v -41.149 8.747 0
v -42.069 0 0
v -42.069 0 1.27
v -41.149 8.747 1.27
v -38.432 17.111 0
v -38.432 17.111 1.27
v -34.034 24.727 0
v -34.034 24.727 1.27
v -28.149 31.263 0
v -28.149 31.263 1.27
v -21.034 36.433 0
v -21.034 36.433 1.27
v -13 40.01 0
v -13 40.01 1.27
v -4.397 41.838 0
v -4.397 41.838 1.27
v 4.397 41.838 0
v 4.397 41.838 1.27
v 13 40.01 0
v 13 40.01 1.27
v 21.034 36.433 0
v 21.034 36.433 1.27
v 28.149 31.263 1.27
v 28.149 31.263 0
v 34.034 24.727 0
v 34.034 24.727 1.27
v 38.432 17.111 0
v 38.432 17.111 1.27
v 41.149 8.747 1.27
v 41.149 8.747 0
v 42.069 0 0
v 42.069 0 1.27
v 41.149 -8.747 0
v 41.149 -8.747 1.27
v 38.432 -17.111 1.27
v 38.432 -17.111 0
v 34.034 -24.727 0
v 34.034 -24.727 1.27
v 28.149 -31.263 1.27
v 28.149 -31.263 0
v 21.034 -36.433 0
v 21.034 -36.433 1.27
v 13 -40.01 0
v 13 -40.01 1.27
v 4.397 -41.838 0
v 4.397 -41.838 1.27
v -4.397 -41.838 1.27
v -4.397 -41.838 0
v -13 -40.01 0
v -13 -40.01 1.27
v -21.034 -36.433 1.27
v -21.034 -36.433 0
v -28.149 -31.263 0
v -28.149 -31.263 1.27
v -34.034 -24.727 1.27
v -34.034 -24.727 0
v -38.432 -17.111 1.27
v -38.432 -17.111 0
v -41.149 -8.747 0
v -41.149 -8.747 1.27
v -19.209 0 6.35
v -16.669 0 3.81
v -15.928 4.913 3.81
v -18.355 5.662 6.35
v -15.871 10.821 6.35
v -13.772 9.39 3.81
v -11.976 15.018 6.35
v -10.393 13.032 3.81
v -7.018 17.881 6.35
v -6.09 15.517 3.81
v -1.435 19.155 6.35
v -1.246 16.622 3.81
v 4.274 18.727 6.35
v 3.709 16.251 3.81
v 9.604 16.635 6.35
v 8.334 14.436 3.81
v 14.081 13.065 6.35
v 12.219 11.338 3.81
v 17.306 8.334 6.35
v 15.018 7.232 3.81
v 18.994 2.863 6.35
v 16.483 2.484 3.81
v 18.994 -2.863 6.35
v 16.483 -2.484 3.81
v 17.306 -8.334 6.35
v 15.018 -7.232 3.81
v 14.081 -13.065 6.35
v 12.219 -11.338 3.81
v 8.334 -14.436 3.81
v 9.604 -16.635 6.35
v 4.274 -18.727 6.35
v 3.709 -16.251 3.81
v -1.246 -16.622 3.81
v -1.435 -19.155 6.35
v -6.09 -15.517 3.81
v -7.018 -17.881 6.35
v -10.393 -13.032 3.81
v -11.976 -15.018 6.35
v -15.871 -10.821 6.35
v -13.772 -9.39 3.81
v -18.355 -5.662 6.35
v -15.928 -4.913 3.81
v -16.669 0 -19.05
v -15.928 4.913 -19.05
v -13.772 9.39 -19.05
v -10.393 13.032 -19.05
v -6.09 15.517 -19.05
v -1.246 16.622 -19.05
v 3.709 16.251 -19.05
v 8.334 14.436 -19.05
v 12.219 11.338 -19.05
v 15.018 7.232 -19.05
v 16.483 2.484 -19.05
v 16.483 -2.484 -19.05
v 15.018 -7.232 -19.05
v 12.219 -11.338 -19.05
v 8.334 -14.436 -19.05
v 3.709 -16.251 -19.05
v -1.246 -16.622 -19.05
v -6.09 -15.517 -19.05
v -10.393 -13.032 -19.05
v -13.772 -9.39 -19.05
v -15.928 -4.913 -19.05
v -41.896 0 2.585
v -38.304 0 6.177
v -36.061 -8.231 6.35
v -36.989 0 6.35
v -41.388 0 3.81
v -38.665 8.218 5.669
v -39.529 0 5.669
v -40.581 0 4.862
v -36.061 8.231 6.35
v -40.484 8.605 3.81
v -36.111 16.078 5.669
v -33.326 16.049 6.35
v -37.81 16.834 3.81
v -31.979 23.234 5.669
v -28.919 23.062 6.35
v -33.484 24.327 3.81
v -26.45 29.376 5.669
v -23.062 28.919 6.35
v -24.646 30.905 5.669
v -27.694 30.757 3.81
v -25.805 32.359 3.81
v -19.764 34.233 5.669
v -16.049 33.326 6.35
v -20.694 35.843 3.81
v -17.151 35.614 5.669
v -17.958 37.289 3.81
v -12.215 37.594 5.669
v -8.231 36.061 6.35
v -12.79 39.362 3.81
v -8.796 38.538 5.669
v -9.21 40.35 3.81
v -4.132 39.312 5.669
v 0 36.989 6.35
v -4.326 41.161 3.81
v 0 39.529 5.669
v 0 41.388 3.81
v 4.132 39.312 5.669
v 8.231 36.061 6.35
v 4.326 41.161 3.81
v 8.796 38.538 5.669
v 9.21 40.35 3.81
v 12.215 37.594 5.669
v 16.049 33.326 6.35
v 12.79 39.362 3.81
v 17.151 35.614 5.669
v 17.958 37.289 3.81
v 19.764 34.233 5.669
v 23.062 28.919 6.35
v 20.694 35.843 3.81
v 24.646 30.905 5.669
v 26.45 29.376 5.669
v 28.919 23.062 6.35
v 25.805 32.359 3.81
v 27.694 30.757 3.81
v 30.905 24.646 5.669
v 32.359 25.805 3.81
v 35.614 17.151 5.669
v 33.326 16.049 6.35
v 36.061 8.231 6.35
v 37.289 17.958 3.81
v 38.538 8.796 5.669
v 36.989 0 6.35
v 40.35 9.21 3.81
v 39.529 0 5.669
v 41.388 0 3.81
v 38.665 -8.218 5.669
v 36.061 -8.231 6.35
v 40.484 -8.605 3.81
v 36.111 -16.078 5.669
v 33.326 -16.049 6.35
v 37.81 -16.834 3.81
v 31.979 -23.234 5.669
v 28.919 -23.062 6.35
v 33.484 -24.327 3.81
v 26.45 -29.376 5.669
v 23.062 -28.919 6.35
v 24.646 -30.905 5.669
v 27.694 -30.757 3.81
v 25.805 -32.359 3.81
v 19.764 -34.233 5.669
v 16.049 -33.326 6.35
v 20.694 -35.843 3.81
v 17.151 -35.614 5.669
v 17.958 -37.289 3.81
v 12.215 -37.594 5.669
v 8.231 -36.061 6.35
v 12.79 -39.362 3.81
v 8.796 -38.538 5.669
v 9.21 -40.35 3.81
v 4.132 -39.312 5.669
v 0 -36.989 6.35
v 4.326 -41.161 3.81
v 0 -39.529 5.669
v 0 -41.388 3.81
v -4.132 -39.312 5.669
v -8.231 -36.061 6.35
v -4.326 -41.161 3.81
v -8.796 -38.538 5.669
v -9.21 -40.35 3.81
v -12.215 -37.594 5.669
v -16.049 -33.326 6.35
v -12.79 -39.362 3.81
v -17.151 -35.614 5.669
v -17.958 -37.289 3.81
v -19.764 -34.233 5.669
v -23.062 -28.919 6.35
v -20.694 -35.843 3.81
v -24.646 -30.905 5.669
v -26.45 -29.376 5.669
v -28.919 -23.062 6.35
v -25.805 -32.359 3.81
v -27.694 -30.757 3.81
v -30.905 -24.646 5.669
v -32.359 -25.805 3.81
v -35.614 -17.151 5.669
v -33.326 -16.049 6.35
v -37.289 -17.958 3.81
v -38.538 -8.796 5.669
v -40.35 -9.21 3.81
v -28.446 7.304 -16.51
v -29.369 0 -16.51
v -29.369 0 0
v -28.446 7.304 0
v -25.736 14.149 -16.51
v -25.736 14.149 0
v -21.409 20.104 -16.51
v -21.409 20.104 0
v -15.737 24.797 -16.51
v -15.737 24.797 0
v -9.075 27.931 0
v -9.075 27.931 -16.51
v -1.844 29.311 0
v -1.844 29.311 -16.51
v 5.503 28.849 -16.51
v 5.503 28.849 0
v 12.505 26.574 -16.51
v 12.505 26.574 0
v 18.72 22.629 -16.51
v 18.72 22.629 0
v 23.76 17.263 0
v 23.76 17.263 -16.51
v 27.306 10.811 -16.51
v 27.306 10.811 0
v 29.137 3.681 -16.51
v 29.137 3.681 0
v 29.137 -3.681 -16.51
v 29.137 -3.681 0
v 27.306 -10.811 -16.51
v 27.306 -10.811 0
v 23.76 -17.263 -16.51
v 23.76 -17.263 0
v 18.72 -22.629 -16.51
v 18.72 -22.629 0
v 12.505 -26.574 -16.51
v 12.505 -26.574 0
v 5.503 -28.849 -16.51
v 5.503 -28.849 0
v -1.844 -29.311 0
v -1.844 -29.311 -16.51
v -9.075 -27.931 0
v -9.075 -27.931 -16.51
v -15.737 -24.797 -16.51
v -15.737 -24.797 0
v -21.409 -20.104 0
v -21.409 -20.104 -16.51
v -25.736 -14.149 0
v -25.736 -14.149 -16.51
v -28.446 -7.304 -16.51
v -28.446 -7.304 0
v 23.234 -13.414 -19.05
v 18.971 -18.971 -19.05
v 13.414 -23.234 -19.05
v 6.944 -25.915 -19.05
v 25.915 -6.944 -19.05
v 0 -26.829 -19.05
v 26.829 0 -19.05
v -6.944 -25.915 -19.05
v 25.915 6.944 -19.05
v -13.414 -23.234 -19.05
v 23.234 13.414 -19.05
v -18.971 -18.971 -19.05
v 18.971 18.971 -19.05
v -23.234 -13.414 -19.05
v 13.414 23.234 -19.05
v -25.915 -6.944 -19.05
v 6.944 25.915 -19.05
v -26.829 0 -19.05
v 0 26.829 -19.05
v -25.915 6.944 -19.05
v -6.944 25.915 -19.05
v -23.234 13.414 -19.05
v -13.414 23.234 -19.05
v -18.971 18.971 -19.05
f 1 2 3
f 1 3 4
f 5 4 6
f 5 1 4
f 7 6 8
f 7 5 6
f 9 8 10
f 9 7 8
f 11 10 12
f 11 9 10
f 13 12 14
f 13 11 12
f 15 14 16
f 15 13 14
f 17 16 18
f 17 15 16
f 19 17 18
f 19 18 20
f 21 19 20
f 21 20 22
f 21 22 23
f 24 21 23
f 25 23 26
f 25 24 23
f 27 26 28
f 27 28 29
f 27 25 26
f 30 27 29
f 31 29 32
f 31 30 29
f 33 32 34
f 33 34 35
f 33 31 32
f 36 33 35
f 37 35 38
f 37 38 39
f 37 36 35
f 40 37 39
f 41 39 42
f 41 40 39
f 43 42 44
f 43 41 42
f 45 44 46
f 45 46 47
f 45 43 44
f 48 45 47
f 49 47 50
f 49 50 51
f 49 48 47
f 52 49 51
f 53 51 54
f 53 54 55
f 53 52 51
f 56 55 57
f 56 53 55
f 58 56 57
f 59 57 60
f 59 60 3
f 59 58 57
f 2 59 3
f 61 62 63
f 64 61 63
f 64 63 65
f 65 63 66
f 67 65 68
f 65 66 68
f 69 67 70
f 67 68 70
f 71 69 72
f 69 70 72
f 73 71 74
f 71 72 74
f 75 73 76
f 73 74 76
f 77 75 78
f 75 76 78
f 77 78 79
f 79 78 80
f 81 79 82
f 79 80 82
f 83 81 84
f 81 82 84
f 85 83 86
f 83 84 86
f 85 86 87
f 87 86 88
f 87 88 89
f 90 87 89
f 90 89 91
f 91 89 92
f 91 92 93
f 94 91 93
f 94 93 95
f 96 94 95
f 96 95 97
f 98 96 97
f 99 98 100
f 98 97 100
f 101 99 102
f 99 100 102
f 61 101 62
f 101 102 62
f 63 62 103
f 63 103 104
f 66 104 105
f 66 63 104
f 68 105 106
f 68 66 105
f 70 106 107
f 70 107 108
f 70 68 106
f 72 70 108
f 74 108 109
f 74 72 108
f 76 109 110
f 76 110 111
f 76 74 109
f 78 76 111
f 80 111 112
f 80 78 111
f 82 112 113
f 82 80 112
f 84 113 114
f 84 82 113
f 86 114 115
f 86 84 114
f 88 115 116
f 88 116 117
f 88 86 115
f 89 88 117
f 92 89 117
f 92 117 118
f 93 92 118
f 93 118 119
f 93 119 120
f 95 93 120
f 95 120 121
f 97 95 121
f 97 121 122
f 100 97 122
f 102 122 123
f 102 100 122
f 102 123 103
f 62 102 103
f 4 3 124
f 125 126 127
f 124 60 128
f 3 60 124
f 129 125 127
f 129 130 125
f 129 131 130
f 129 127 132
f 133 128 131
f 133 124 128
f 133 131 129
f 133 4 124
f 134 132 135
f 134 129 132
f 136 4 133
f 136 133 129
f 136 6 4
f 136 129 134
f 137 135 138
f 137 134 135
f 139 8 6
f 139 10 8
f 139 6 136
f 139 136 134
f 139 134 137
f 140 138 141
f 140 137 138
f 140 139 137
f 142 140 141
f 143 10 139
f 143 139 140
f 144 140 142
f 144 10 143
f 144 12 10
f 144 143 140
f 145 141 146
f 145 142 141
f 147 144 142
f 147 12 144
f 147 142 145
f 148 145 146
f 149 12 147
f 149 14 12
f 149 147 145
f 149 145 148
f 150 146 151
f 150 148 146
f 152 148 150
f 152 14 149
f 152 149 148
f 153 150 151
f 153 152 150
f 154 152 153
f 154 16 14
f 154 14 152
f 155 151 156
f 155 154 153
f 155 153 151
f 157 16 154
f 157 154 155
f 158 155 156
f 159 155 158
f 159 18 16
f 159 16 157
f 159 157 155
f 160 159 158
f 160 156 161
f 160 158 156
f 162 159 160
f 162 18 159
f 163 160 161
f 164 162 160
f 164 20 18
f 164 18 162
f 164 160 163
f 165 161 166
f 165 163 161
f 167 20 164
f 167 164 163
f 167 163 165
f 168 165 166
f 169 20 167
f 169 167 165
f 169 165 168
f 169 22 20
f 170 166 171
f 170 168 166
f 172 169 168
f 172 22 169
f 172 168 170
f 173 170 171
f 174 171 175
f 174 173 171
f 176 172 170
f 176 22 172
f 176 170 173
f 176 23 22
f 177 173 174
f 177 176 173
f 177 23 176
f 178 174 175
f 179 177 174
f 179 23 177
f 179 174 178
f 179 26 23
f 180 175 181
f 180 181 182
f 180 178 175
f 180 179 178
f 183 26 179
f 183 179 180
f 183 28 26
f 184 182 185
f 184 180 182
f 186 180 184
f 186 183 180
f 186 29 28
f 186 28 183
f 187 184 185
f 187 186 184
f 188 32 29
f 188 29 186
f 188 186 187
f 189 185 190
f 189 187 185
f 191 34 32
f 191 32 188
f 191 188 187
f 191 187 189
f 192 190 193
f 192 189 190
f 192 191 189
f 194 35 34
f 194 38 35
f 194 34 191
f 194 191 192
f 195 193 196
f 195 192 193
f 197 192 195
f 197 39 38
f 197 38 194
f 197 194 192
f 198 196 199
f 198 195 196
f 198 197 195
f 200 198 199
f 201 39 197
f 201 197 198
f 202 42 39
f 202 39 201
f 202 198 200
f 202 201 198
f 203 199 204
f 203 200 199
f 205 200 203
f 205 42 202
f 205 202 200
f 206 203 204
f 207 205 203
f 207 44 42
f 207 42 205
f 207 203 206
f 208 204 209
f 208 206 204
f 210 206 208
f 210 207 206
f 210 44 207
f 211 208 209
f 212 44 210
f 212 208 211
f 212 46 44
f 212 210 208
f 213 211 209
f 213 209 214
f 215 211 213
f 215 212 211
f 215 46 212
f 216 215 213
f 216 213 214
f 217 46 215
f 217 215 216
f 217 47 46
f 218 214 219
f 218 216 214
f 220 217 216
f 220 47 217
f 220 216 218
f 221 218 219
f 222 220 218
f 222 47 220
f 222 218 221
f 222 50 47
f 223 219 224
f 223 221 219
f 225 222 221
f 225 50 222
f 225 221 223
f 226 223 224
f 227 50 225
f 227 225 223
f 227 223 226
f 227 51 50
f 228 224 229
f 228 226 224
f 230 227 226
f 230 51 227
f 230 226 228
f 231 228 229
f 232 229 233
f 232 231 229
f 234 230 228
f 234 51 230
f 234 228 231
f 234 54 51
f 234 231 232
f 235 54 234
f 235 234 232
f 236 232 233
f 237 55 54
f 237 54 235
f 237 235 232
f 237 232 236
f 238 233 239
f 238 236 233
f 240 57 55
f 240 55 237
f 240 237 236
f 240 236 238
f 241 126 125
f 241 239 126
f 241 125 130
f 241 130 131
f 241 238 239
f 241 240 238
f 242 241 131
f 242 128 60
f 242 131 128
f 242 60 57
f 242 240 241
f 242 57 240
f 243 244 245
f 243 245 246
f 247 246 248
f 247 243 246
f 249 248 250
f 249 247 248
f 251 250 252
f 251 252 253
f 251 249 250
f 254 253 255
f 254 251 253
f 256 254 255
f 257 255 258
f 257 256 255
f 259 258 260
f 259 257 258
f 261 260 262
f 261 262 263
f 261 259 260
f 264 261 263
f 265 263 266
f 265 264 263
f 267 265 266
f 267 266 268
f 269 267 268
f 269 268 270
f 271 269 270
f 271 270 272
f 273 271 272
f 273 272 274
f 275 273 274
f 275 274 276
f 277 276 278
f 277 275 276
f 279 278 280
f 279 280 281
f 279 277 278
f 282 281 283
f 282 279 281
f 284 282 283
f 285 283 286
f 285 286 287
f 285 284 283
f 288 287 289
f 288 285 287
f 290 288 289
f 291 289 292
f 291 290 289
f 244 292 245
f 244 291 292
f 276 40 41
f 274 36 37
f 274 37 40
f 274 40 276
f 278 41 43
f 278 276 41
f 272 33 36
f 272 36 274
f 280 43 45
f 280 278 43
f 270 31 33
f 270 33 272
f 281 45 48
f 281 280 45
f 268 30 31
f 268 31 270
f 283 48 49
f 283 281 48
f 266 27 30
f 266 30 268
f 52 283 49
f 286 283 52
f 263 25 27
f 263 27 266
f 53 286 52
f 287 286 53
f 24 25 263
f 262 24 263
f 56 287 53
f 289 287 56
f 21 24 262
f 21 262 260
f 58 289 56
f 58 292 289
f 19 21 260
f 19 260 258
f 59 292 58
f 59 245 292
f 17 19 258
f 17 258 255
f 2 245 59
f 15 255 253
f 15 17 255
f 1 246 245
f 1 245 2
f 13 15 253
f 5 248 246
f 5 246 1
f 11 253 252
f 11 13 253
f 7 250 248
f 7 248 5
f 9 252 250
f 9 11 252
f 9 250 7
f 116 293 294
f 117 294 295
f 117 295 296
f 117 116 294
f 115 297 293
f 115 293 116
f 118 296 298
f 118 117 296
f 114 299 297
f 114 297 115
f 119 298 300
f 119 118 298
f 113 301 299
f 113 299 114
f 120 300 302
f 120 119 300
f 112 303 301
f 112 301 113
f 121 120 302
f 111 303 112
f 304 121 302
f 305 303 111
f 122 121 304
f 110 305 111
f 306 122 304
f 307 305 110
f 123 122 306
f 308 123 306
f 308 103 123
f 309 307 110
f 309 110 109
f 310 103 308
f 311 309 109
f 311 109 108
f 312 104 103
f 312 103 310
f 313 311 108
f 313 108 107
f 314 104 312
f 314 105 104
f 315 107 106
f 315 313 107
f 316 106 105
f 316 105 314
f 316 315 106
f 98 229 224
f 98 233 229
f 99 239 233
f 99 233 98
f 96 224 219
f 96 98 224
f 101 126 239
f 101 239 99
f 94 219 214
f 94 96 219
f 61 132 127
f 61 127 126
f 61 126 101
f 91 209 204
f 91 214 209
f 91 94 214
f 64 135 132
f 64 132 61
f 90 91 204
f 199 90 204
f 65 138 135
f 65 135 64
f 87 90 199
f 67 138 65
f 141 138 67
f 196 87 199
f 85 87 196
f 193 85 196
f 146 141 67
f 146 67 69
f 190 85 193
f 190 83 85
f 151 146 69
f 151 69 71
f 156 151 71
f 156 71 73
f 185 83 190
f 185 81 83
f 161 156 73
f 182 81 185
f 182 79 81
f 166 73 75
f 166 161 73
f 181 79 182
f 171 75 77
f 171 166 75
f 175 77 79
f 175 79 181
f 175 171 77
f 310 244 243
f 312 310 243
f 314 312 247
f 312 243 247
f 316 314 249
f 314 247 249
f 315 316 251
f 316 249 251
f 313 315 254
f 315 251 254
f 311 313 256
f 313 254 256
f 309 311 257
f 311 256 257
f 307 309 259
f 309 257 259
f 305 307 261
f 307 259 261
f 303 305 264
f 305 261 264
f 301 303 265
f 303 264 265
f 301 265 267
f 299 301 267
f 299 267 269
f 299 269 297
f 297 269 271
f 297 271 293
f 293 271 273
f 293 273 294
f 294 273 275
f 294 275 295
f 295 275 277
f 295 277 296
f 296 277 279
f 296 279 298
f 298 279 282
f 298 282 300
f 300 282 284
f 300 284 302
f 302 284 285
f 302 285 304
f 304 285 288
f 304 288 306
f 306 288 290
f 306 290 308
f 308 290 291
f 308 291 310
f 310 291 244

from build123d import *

# Parameters (mm, degrees)
F2_R    = 5.08
F3_SIZE = 2.54
F4_SIZE = 2.54


with BuildPart() as f1:
    # F0 (on Front) → F1 (revolve)
    with BuildSketch(Plane.XZ):
        Polygon((-42.06875, 0), (-29.36875, 0), (-29.36875, -19.05), (-16.66875, -19.05), (-16.66875, 6.35), (-42.06875, 6.35), align=None)
    revolve(axis=Axis((0, 0, -9.525), (0, 0, -1)))

    # F2
    f2_edges = [f1.edges().sort_by_distance(p)[0] for p in [
        (42.06875, 0, 6.35),
    ]]
    fillet(f2_edges, radius=F2_R)

    # F3
    f3_edges = [f1.edges().sort_by_distance(p)[0] for p in [
        (16.66875, 0, 6.35),
    ]]
    chamfer(f3_edges, length=F3_SIZE)

    # F4
    f4_edges = [f1.edges().sort_by_distance(p)[0] for p in [
        (29.36875, 0, -19.05),
    ]]
    chamfer(f4_edges, length=F4_SIZE)


solid = f1.part
